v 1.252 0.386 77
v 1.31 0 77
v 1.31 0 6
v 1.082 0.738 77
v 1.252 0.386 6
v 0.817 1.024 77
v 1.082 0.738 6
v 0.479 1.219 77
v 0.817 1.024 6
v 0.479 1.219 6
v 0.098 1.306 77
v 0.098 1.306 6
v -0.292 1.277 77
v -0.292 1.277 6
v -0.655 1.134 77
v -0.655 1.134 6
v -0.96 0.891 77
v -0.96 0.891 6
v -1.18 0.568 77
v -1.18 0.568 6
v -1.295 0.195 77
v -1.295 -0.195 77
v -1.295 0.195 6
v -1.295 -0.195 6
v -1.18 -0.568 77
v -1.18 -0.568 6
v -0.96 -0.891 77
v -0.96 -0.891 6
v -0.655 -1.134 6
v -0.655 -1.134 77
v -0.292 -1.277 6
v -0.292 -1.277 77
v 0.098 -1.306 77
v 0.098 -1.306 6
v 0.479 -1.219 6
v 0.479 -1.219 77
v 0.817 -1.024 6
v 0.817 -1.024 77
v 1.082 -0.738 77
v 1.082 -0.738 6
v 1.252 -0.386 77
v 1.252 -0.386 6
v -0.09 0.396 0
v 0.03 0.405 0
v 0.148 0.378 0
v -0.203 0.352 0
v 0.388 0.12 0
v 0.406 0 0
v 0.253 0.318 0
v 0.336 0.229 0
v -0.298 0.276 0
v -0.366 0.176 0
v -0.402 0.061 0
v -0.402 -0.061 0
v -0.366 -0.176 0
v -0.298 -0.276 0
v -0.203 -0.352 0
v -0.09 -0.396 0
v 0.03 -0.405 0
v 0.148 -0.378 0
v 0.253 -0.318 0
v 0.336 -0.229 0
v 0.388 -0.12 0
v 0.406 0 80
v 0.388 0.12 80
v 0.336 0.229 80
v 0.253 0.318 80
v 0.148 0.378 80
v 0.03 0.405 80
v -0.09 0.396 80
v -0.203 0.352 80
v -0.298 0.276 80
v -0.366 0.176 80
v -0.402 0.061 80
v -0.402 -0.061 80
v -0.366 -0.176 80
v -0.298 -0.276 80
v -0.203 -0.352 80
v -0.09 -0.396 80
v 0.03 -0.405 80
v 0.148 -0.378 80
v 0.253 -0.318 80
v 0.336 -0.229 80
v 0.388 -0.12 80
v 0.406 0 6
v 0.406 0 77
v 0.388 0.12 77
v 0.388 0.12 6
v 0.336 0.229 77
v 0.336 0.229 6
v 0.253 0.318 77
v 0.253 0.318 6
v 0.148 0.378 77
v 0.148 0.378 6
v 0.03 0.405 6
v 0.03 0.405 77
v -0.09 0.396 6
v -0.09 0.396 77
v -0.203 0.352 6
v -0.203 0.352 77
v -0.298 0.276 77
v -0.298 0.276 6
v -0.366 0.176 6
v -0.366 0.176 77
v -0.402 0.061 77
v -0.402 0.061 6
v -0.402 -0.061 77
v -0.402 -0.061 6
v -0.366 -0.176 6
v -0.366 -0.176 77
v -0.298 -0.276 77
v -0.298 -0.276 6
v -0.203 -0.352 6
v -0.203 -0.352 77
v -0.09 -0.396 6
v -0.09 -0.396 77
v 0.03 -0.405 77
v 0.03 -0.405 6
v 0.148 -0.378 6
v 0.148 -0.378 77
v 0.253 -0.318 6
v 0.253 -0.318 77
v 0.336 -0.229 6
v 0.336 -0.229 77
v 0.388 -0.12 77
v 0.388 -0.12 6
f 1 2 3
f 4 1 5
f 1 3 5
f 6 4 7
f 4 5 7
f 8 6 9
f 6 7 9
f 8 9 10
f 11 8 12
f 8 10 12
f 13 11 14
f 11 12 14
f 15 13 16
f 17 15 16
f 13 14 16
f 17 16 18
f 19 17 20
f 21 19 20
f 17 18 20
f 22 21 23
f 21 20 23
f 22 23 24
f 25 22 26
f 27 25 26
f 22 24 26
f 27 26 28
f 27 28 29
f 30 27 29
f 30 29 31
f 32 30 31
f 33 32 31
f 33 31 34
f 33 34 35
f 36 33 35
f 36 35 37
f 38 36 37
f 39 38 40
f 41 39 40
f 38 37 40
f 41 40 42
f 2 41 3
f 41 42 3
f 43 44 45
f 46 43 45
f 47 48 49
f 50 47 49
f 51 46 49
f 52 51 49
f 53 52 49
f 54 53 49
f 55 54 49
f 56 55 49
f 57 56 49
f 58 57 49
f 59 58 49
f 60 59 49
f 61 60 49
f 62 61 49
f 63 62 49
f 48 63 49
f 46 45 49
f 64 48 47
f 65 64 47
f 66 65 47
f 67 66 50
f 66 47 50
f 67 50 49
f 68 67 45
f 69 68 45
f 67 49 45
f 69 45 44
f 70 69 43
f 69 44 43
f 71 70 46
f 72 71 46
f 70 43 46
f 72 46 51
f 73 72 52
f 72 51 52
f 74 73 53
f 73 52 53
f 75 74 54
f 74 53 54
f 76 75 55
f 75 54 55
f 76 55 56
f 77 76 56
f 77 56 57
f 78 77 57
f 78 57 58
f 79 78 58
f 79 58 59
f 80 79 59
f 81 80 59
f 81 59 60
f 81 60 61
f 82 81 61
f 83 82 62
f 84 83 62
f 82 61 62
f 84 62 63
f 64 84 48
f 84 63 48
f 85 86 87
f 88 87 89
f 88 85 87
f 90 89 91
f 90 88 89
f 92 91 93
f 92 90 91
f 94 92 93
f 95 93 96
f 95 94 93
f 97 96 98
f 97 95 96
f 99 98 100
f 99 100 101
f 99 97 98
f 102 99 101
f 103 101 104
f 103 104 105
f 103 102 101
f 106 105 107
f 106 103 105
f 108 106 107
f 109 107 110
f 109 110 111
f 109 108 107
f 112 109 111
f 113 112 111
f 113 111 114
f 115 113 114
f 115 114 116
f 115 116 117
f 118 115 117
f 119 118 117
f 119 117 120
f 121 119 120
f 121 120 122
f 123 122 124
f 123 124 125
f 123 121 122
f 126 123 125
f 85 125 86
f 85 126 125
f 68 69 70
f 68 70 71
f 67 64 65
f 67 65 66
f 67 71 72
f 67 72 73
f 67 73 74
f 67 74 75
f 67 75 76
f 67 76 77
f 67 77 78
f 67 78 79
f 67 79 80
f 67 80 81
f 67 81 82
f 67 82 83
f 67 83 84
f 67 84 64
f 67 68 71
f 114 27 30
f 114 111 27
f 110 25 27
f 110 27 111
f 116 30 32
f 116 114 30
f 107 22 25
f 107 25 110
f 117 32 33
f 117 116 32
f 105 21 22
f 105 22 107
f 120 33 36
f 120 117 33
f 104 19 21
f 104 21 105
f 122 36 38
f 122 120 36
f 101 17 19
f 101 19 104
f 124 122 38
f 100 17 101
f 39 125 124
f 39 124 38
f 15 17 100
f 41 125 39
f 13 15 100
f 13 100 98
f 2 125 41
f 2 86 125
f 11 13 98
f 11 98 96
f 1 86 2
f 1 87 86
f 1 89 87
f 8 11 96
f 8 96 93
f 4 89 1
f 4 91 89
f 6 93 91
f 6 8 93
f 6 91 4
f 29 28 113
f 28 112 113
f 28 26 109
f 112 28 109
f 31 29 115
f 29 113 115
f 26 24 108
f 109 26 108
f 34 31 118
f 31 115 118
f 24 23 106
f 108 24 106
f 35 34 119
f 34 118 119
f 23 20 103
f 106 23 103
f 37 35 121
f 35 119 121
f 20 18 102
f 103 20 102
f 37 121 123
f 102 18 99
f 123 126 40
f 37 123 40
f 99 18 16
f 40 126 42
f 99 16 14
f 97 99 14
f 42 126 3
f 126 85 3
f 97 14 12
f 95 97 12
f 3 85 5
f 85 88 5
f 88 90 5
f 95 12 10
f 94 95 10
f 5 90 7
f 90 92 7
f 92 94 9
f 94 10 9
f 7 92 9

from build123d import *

# Parameters (mm, degrees)
WIRE_SKETCH_R     = 0.4064
COPPER_DEPTH      = 80
INSULATION_START  = 6
WIRE_SKETCH_3_R   = 1.31
WIRE_SKETCH_3_R_2 = 0.4064
INSULATION_DEPTH  = 71


with BuildPart() as part:
    # wire_sketch → copper (new body)
    with BuildSketch(Plane.XY):
        Circle(WIRE_SKETCH_R)
    extrude(amount=COPPER_DEPTH)


with BuildPart() as body_2:
    # wire_sketch<3> → insulation (new body)
    with BuildSketch(Plane.XY.offset(INSULATION_START)):
        Circle(WIRE_SKETCH_3_R)
        Circle(WIRE_SKETCH_3_R_2, mode=Mode.SUBTRACT)
    extrude(amount=INSULATION_DEPTH)


solid = Compound([part.part, body_2.part])
